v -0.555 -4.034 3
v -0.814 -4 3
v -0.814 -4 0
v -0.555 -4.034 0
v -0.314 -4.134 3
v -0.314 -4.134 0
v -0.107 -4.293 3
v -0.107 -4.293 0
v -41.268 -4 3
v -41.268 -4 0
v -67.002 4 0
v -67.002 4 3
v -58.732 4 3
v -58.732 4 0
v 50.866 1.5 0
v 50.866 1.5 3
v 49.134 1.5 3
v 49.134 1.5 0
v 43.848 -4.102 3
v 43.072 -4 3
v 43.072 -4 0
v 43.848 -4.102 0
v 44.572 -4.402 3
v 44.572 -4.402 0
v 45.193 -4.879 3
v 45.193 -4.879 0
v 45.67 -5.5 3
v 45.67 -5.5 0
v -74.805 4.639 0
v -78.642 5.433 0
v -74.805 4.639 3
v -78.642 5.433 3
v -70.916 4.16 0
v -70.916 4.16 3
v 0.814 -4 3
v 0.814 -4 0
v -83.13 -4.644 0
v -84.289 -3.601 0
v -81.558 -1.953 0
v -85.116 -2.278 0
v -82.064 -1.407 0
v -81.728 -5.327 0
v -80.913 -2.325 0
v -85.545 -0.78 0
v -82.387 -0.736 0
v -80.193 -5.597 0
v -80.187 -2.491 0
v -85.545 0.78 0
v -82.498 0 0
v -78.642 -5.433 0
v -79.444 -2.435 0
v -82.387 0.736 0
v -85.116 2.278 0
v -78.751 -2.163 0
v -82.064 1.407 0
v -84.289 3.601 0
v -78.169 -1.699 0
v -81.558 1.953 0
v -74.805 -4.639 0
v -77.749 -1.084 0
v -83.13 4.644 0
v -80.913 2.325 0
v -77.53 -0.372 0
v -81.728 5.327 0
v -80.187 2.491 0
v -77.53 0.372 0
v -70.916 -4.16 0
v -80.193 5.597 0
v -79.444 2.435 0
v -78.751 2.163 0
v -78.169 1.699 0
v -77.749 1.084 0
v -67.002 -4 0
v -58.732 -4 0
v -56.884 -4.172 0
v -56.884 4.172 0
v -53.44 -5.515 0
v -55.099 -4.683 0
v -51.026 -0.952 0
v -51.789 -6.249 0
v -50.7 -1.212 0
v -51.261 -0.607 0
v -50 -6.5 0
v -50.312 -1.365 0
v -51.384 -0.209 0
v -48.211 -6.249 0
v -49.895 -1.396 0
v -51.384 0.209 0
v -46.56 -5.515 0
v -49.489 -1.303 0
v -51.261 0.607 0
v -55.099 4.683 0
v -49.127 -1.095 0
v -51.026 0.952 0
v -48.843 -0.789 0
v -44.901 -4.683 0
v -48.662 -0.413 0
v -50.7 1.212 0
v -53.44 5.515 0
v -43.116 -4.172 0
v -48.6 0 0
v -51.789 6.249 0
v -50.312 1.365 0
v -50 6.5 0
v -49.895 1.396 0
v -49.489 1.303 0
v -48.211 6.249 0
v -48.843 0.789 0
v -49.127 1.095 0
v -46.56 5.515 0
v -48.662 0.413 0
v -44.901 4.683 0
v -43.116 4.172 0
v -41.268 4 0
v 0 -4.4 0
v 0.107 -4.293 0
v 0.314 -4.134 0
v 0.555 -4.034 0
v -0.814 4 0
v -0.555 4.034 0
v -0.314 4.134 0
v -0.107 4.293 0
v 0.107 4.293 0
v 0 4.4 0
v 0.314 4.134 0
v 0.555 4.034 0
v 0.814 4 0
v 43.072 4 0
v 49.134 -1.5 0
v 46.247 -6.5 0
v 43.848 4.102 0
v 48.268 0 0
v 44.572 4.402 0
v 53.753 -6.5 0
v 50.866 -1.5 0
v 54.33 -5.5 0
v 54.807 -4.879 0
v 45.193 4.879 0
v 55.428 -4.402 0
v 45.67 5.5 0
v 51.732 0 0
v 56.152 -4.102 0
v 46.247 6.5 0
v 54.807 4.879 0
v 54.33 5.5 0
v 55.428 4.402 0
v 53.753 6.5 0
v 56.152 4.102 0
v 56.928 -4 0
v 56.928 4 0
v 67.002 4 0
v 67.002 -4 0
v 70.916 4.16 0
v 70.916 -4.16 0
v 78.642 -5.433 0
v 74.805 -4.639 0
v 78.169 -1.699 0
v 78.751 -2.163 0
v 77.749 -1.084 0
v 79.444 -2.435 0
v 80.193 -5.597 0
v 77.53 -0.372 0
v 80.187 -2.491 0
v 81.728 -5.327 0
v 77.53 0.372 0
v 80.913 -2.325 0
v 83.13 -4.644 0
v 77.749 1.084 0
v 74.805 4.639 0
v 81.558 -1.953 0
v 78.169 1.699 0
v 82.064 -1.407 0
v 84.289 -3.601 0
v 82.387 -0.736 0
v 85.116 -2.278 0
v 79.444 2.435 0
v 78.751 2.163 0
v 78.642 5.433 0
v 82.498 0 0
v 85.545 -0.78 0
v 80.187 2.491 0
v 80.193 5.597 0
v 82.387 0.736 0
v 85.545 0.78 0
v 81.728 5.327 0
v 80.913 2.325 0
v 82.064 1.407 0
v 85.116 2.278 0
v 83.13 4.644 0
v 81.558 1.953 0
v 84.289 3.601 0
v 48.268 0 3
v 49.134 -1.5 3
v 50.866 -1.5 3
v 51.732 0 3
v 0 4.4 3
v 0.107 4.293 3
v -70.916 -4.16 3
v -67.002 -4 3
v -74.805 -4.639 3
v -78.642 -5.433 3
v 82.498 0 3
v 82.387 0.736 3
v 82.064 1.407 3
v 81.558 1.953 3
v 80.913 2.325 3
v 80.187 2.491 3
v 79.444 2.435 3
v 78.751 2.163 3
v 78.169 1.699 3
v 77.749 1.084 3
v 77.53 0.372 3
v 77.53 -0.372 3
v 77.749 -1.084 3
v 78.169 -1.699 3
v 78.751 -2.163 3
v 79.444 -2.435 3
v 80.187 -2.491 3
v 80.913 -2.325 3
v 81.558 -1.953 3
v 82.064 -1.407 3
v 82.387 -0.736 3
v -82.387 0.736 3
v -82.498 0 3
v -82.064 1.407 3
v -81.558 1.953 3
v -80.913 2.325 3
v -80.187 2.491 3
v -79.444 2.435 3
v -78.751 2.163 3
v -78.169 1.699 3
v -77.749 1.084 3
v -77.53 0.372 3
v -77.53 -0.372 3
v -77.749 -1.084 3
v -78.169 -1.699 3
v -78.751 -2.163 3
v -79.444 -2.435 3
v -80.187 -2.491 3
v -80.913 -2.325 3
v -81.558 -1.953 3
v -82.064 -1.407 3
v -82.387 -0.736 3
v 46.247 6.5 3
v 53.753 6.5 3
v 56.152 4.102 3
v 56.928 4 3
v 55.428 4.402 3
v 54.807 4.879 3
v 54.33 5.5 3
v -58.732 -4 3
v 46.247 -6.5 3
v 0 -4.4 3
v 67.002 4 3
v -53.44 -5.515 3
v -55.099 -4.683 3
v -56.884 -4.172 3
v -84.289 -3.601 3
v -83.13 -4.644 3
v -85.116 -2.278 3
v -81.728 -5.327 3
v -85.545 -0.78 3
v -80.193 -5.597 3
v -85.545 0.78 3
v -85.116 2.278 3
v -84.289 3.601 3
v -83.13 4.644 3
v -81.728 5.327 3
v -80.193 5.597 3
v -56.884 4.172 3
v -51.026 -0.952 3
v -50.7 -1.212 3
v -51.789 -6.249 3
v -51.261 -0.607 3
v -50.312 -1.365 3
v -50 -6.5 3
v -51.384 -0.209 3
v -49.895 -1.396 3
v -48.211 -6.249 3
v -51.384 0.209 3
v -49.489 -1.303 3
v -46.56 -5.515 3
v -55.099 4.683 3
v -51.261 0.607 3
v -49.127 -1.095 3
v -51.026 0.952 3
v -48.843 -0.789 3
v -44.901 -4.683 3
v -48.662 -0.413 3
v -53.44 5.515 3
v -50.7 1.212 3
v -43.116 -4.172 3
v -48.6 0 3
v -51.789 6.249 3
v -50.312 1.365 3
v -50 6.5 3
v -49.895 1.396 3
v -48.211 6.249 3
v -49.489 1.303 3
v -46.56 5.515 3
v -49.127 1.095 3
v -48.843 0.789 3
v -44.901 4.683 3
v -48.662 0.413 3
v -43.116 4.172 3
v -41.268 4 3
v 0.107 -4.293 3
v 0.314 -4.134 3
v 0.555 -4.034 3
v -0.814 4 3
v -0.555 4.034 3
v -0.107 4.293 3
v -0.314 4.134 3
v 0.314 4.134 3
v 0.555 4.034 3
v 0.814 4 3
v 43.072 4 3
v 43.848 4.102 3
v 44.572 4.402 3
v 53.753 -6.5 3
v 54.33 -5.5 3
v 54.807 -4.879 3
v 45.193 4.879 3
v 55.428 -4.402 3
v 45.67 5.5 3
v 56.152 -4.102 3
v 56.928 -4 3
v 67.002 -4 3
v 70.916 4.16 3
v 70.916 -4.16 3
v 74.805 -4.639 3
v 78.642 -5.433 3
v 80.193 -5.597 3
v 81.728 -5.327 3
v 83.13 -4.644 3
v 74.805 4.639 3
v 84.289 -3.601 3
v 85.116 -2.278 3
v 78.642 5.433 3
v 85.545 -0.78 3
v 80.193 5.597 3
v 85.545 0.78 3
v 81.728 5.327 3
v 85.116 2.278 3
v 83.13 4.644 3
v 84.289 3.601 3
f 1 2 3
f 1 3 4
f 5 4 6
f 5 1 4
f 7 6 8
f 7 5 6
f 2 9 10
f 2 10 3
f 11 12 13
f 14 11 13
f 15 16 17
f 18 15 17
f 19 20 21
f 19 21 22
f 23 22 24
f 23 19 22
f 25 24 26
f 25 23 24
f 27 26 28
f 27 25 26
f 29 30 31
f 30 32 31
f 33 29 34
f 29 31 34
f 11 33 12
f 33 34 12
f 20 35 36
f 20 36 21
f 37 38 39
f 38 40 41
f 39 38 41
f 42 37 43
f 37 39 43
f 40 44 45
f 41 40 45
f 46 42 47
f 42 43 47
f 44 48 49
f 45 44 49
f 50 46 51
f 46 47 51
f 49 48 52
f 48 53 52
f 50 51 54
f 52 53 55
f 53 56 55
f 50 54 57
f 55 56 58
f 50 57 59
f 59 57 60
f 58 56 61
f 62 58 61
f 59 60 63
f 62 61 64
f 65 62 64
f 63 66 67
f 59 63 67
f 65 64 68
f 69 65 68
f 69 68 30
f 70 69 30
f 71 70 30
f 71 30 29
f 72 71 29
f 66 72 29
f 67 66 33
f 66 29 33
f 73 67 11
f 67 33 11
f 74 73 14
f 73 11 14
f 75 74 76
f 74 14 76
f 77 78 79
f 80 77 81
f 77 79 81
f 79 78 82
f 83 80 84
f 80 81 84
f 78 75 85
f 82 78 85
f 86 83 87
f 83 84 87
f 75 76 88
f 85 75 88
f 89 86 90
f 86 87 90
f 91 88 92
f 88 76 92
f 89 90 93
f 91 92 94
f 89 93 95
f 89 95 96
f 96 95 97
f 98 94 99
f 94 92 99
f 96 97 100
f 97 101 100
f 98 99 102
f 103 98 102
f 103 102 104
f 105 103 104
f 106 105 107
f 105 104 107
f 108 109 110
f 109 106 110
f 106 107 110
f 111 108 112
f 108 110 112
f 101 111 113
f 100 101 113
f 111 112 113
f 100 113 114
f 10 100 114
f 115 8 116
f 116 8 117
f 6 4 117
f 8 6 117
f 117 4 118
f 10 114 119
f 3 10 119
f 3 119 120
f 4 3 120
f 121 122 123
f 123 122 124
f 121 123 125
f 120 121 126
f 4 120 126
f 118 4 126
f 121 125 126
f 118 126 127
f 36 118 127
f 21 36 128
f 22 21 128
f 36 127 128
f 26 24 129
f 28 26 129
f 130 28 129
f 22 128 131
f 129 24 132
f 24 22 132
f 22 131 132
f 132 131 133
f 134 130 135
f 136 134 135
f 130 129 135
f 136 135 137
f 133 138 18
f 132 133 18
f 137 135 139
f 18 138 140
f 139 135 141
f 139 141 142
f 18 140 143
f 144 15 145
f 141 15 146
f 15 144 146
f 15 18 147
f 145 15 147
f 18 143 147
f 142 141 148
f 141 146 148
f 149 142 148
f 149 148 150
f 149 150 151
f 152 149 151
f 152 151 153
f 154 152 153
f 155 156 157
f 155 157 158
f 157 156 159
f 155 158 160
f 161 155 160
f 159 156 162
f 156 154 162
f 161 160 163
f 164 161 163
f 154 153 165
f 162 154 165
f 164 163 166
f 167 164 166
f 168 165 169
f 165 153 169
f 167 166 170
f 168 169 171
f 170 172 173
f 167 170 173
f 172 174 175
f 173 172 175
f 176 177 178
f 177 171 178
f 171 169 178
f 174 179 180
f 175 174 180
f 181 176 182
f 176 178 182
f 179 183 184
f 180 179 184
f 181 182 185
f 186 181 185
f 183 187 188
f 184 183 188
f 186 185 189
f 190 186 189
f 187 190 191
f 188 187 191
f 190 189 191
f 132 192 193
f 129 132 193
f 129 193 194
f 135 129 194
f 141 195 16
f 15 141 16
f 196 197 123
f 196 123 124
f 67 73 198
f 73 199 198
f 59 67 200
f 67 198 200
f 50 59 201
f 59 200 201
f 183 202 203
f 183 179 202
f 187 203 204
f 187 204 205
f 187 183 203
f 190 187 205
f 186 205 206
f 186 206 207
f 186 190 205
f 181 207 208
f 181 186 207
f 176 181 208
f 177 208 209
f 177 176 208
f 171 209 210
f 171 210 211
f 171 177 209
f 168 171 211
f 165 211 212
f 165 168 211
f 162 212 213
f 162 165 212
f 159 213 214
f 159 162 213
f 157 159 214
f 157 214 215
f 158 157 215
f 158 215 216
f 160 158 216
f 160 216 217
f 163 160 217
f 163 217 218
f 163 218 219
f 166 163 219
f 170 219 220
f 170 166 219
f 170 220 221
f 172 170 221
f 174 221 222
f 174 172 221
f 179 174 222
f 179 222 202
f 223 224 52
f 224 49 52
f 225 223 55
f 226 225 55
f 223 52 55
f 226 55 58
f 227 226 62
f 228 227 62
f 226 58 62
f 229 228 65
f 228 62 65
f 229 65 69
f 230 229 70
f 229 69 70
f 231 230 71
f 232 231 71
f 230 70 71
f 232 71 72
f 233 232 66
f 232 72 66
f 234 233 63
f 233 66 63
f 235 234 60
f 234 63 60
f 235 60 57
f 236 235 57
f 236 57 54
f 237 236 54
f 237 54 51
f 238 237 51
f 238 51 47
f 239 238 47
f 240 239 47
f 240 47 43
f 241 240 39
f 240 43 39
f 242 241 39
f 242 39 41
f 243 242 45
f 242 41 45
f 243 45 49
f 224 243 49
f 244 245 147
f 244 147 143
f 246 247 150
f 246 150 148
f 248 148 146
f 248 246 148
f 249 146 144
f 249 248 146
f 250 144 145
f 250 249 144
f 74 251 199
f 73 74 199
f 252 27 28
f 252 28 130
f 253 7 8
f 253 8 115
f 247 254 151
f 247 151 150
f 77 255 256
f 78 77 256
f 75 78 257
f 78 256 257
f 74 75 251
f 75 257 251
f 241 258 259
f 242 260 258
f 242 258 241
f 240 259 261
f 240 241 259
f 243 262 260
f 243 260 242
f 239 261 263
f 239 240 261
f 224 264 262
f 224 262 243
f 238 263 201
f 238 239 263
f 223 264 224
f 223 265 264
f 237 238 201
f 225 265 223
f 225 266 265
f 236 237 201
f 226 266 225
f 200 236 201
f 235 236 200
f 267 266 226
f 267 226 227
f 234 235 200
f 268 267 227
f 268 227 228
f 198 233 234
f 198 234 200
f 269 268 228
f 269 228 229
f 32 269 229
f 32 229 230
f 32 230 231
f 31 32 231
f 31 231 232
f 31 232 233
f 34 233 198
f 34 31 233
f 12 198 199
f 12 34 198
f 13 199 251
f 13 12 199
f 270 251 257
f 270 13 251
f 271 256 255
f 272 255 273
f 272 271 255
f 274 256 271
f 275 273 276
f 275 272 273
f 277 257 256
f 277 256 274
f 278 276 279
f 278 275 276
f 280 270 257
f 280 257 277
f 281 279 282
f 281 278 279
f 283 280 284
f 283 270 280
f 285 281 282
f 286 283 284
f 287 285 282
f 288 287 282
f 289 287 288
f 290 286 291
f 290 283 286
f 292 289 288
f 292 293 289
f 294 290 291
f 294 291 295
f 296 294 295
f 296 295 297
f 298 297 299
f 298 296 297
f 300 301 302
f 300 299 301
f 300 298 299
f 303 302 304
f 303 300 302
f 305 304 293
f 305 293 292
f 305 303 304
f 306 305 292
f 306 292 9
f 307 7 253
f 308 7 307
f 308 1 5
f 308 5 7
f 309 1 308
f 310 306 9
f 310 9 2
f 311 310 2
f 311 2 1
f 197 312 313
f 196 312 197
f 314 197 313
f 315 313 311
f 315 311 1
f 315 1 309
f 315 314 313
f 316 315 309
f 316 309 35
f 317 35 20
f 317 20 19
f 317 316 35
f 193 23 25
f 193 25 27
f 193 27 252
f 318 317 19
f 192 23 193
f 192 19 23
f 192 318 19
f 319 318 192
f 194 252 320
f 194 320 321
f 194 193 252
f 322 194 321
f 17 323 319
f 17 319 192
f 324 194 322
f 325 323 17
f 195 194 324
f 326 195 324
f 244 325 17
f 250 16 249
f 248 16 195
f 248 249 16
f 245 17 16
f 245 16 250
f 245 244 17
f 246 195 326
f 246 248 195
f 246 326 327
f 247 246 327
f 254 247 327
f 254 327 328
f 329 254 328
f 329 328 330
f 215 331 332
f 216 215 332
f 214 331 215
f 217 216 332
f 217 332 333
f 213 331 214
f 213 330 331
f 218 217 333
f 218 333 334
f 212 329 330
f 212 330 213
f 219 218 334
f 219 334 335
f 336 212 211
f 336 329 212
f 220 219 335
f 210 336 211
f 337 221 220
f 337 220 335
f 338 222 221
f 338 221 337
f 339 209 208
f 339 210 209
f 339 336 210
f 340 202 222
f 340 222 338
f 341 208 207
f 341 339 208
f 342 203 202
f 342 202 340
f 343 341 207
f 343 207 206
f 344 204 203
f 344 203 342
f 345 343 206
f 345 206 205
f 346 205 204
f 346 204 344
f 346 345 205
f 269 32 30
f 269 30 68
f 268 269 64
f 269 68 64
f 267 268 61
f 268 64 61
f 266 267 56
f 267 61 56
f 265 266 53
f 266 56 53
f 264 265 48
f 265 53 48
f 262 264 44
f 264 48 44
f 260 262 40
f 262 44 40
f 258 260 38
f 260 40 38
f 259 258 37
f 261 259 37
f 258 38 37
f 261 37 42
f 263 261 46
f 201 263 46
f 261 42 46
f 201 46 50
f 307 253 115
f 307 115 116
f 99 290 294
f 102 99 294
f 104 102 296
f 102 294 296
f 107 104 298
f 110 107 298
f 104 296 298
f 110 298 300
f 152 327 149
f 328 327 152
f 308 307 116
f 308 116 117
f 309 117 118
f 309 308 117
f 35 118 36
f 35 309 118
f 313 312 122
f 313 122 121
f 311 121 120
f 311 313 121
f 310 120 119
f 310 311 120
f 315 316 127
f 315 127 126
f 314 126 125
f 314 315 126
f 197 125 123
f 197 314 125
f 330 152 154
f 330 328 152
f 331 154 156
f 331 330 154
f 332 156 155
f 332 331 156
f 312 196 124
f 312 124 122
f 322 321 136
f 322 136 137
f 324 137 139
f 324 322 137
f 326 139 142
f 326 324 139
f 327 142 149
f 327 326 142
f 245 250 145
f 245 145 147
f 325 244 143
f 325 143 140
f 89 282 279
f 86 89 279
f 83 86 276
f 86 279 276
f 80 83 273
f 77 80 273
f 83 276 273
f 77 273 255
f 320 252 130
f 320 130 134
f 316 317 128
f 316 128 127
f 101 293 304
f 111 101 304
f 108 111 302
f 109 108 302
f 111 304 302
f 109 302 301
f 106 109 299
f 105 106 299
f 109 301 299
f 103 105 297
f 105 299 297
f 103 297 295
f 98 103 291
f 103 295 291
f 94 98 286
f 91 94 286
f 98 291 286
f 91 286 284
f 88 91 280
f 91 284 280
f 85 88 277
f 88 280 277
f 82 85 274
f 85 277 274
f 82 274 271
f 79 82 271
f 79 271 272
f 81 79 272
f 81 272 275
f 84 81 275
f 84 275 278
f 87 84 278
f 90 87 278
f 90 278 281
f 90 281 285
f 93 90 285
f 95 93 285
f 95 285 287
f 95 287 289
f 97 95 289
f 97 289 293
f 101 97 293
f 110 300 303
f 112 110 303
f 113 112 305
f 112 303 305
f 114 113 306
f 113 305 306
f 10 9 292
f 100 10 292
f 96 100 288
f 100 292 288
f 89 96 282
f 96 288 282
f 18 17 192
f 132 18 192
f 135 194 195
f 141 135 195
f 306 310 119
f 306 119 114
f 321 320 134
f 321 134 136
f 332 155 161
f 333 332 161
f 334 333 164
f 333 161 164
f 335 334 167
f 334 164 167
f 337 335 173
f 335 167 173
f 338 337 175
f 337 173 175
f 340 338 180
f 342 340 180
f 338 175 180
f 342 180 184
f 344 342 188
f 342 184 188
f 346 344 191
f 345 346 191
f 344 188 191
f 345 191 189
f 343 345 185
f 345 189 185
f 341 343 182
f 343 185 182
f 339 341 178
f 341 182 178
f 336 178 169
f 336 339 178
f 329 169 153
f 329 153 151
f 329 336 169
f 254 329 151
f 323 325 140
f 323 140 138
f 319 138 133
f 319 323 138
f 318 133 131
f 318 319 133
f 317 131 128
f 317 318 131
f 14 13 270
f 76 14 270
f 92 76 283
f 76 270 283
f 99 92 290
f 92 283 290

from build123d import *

# Parameters (mm, degrees)
SKETCH1_R           = 1.5
BOSS_EXTRUDE1_DEPTH = 3
SKETCH3_W           = 1.998076211
SKETCH3_H           = 3
FILLET1_R           = 48
BOSS_EXTRUDE3_DEPTH = 3
SKETCH8_R           = 1.4
CUT_EXTRUDE3_DEPTH  = 4
SKETCH9_R           = 4
BOSS_EXTRUDE6_DEPTH = 3


with BuildPart() as part:
    # Sketch1 → Boss-Extrude1 (new body)
    with BuildSketch(Plane.XY):
        with BuildLine():
            Line((-76.080816412, -4), (76.080816412, -4))
            ThreePointArc((76.080816412, -4), (85.6, 0), (76.080816412, 4))
            Line((76.080816412, 4), (-76.080816412, 4))
            ThreePointArc((-76.080816412, 4), (-85.6, 0), (-76.080816412, -4))
        make_face()
        with Locations((-80, 0)):
            Circle(SKETCH1_R, mode=Mode.SUBTRACT)
        with Locations((80, 0)):
            Circle(SKETCH1_R, mode=Mode.SUBTRACT)
    extrude(amount=BOSS_EXTRUDE1_DEPTH)

    # Sketch3 → Cut-Revolve1 (revolve, cut)
    with BuildSketch(Plane(origin=(0, 0, 0), x_dir=(1, 0, 0), z_dir=(0, 1, 0))):
        with Locations((81.499038106, -1.5)):
            Rectangle(SKETCH3_W, SKETCH3_H)
    cut_revolve1 = revolve(axis=Axis((80, 0, 0), (0, 0, 1)), mode=Mode.SUBTRACT)

    # Mirror1: Cut-Revolve1 across plane
    add(cut_revolve1.mirror(Plane(origin=(0, 0, 0), x_dir=(0, 0, 1), z_dir=(1, 0, 0))), mode=Mode.SUBTRACT)

    # Fillet1
    fillet1_edges = [part.edges().sort_by_distance(p)[0] for p in [
        (76.080816412, -4, 1.5),
        (-76.080816412, -4, 1.5),
        (-76.080816412, 4, 1.5),
        (76.080816412, 4, 1.5),
    ]]
    fillet(fillet1_edges, radius=FILLET1_R)

    # Sketch4 → Boss-Extrude3 (add, through all)
    with BuildSketch(Plane.XY.offset(3)):
        with BuildLine():
            Line((0, -4.4), (0.107106781, -4.292893219))
            ThreePointArc((0.107106781, -4.292893219), (0.43153013, -4.076120467), (0.814213562, -4))
            Line((0.814213562, -4), (4.4, -4))
            Line((4.4, -4), (4.4, 4))
            Line((4.4, 4), (0.814213562, 4))
            ThreePointArc((0.814213562, 4), (0.43153013, 4.076120467), (0.107106781, 4.292893219))
            Line((0.107106781, 4.292893219), (0, 4.4))
            Line((0, 4.4), (-0.107106781, 4.292893219))
            ThreePointArc((-0.107106781, 4.292893219), (-0.43153013, 4.076120467), (-0.814213562, 4))
            Line((-0.814213562, 4), (-4.4, 4))
            Line((-4.4, 4), (-4.4, -4))
            Line((-4.4, -4), (-0.814213562, -4))
            ThreePointArc((-0.814213562, -4), (-0.43153013, -4.076120467), (-0.107106781, -4.292893219))
            Line((-0.107106781, -4.292893219), (0, -4.4))
        make_face()
    extrude(amount=-BOSS_EXTRUDE3_DEPTH)

    # Sketch8 → Cut-Extrude3 (cut, through all)
    with BuildSketch(Plane.XY.offset(3)):
        with Locations((-50, 0)):
            Circle(SKETCH8_R)
        Polygon((51.732050808, 0), (50.866025404, 1.5), (49.133974596, 1.5), (48.267949192, 0), (49.133974596, -1.5), (50.866025404, -1.5), align=None)
    extrude(amount=-CUT_EXTRUDE3_DEPTH, mode=Mode.SUBTRACT)

    # Sketch9 → Boss-Extrude6 (add, through all)
    with BuildSketch(Plane.XY.offset(3)):
        with BuildLine():
            Line((38, -4), (43.07179677, -4))
            ThreePointArc((43.07179677, -4), (44.57179677, -4.401923789), (45.669872981, -5.5))
            Line((45.669872981, -5.5), (46.24722325, -6.5))
            Line((46.24722325, -6.5), (53.75277675, -6.5))
            Line((53.75277675, -6.5), (54.330127019, -5.5))
            ThreePointArc((54.330127019, -5.5), (55.42820323, -4.401923789), (56.92820323, -4))
            Line((56.92820323, -4), (62, -4))
            Line((62, -4), (62, 4))
            Line((62, 4), (56.92820323, 4))
            ThreePointArc((56.92820323, 4), (55.42820323, 4.401923789), (54.330127019, 5.5))
            Line((54.330127019, 5.5), (53.75277675, 6.5))
            Line((53.75277675, 6.5), (46.24722325, 6.5))
            Line((46.24722325, 6.5), (45.669872981, 5.5))
            ThreePointArc((45.669872981, 5.5), (44.57179677, 4.401923789), (43.07179677, 4))
            Line((43.07179677, 4), (38, 4))
            Line((38, 4), (38, -4))
        make_face()
        with Locations((50, 0)):
            Circle(SKETCH9_R, mode=Mode.SUBTRACT)
        with BuildLine():
            Line((-58.732124598, -4), (-62, -4))
            Line((-62, -4), (-62, 4))
            Line((-62, 4), (-58.732124598, 4))
            ThreePointArc((-58.732124598, 4), (-55.979715185, 4.386247225), (-53.439927872, 5.515151515))
            ThreePointArc((-53.439927872, 5.515151515), (-50, 6.5), (-46.560072128, 5.515151515))
            ThreePointArc((-46.560072128, 5.515151515), (-44.020284815, 4.386247225), (-41.267875402, 4))
            Line((-41.267875402, 4), (-38, 4))
            Line((-38, 4), (-38, -4))
            Line((-38, -4), (-41.267875402, -4))
            ThreePointArc((-41.267875402, -4), (-44.020284815, -4.386247225), (-46.560072128, -5.515151515))
            ThreePointArc((-46.560072128, -5.515151515), (-50, -6.5), (-53.439927872, -5.515151515))
            ThreePointArc((-53.439927872, -5.515151515), (-55.979715185, -4.386247225), (-58.732124598, -4))
        make_face()
        with Locations((-50, 0)):
            Circle(SKETCH9_R, mode=Mode.SUBTRACT)
    extrude(amount=-BOSS_EXTRUDE6_DEPTH)


solid = part.part
